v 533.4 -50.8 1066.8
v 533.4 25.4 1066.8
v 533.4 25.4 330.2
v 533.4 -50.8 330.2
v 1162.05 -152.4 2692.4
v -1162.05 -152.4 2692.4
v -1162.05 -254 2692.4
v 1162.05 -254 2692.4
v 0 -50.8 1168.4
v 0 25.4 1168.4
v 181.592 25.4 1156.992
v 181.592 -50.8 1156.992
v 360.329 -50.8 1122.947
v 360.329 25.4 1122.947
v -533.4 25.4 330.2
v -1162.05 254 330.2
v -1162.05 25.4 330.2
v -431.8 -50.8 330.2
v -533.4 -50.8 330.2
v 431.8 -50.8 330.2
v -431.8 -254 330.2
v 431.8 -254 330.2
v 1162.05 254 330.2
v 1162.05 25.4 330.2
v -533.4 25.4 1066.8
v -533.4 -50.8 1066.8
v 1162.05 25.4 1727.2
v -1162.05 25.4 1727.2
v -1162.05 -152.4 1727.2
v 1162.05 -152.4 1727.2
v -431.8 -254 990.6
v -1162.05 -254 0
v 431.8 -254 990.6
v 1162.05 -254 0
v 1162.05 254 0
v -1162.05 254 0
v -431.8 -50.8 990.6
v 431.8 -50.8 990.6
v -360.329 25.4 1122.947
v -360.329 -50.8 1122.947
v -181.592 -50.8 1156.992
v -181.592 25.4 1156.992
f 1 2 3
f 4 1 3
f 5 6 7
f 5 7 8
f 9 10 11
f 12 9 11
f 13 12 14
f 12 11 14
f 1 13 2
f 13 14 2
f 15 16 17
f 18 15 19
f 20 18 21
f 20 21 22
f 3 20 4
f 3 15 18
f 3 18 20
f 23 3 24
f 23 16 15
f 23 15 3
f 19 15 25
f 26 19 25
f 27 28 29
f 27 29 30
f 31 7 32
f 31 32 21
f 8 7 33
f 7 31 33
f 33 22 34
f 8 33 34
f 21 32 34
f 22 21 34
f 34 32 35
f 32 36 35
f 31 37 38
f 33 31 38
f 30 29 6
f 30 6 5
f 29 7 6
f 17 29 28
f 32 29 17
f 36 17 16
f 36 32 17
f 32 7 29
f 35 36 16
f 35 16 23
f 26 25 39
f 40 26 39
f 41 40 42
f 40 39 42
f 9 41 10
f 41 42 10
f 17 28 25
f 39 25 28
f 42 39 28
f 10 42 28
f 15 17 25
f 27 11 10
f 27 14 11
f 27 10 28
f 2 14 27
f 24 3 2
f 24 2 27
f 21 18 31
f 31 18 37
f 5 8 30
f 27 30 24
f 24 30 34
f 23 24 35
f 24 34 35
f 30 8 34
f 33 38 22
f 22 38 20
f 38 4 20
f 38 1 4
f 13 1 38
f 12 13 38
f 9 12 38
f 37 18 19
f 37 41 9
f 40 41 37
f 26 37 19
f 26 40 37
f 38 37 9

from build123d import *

# Parameters (mm, degrees)
F0_W     = 2324.1
F0_H     = 228.6
F1_DEPTH = 330.2
F0_H_2   = 177.8
F2_DEPTH = 1727.2
F0_H_3   = 101.6
F3_DEPTH = 2692.4
F5_DEPTH = 546.1
F6_DEPTH = 76.2


with BuildPart() as f1:
    # F0 (on Top) → F1 (new body)
    with BuildSketch(Plane.XY):
        with Locations((0, 139.7)):
            Rectangle(F0_W, F0_H)
    extrude(amount=F1_DEPTH)

    # F0 (on Top) → F2 (join)
    with BuildSketch(Plane.XY):
        with Locations((0, -63.5)):
            Rectangle(F0_W, F0_H_2)
    extrude(amount=F2_DEPTH)

    # F0 (on Top) → F3 (join)
    with BuildSketch(Plane.XY):
        with Locations((0, -203.2)):
            Rectangle(F0_W, F0_H_3)
    extrude(amount=F3_DEPTH)

    # F4 (on face) → F5 (cut)
    with BuildSketch(Plane(origin=(0, 25.4, 0), x_dir=(-1, 0, 0), z_dir=(0, 1, 0))):
        Polygon((-431.8, 990.6), (-431.8, 330.2), (431.8, 330.2), (431.8, 990.6), (0, 990.6), align=None)
    extrude(amount=-F5_DEPTH, mode=Mode.SUBTRACT)

    # F4 (on face) → F6 (cut)
    with BuildSketch(Plane(origin=(0, 25.4, 0), x_dir=(-1, 0, 0), z_dir=(0, 1, 0))):
        with BuildLine():
            Line((-533.4, 990.6), (-533.4, 330.2))
            Line((-533.4, 330.2), (-431.8, 330.2))
            Line((-431.8, 330.2), (-431.8, 990.6))
            Line((-431.8, 990.6), (0, 990.6))
            Line((0, 990.6), (0, 1168.4))
            ThreePointArc((0, 1168.4), (-271.494991, 1142.773701), (-533.4, 1066.8))
            Line((-533.4, 1066.8), (-533.4, 990.6))
        make_face()
        with BuildLine():
            Line((431.8, 990.6), (431.8, 330.2))
            Line((431.8, 330.2), (533.4, 330.2))
            Line((533.4, 330.2), (533.4, 990.6))
            Line((533.4, 990.6), (533.4, 1066.8))
            ThreePointArc((533.4, 1066.8), (271.494991, 1142.773701), (0, 1168.4))
            Line((0, 1168.4), (0, 990.6))
            Line((0, 990.6), (431.8, 990.6))
        make_face()
    extrude(amount=-F6_DEPTH, mode=Mode.SUBTRACT)


solid = f1.part
